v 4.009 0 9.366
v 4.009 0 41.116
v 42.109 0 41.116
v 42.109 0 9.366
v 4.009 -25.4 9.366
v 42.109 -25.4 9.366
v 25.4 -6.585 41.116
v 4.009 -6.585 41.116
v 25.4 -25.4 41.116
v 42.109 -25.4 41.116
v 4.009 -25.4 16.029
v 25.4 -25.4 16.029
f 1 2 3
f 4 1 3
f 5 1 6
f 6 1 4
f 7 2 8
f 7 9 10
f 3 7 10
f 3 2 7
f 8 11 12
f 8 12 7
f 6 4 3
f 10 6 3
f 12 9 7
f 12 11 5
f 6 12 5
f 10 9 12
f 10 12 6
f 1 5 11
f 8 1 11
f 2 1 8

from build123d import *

# Parameters (mm, degrees)
F0_W      = 38.1
F0_H      = 31.75
F1_DEPTH  = 25.4
F1_FACE_W = 25.4
F1_FACE_H = 31.75
F3_DEPTH  = 25.4


with BuildPart() as f1:
    # F0 (on Front) → F1 (new body)
    with BuildSketch(Plane.XZ):
        with Locations((23.058977, 25.241072)):
            Rectangle(F0_W, F0_H)
    extrude(amount=F1_DEPTH)

    # F2 (on Right) + F1_face (on face) → F3 (cut)
    with BuildSketch(Plane.YZ):
        Polygon((-25.473946, 41.330271), (-25.473946, 15.930271), (-6.423946, 41.330271), align=None)
    with BuildSketch(Plane(origin=(42.108977, -12.7, 25.241072), x_dir=(0, 1, 0), z_dir=(1, 0, 0))):
        Rectangle(F1_FACE_W, F1_FACE_H)
    extrude(amount=F3_DEPTH, mode=Mode.SUBTRACT)


solid = f1.part
